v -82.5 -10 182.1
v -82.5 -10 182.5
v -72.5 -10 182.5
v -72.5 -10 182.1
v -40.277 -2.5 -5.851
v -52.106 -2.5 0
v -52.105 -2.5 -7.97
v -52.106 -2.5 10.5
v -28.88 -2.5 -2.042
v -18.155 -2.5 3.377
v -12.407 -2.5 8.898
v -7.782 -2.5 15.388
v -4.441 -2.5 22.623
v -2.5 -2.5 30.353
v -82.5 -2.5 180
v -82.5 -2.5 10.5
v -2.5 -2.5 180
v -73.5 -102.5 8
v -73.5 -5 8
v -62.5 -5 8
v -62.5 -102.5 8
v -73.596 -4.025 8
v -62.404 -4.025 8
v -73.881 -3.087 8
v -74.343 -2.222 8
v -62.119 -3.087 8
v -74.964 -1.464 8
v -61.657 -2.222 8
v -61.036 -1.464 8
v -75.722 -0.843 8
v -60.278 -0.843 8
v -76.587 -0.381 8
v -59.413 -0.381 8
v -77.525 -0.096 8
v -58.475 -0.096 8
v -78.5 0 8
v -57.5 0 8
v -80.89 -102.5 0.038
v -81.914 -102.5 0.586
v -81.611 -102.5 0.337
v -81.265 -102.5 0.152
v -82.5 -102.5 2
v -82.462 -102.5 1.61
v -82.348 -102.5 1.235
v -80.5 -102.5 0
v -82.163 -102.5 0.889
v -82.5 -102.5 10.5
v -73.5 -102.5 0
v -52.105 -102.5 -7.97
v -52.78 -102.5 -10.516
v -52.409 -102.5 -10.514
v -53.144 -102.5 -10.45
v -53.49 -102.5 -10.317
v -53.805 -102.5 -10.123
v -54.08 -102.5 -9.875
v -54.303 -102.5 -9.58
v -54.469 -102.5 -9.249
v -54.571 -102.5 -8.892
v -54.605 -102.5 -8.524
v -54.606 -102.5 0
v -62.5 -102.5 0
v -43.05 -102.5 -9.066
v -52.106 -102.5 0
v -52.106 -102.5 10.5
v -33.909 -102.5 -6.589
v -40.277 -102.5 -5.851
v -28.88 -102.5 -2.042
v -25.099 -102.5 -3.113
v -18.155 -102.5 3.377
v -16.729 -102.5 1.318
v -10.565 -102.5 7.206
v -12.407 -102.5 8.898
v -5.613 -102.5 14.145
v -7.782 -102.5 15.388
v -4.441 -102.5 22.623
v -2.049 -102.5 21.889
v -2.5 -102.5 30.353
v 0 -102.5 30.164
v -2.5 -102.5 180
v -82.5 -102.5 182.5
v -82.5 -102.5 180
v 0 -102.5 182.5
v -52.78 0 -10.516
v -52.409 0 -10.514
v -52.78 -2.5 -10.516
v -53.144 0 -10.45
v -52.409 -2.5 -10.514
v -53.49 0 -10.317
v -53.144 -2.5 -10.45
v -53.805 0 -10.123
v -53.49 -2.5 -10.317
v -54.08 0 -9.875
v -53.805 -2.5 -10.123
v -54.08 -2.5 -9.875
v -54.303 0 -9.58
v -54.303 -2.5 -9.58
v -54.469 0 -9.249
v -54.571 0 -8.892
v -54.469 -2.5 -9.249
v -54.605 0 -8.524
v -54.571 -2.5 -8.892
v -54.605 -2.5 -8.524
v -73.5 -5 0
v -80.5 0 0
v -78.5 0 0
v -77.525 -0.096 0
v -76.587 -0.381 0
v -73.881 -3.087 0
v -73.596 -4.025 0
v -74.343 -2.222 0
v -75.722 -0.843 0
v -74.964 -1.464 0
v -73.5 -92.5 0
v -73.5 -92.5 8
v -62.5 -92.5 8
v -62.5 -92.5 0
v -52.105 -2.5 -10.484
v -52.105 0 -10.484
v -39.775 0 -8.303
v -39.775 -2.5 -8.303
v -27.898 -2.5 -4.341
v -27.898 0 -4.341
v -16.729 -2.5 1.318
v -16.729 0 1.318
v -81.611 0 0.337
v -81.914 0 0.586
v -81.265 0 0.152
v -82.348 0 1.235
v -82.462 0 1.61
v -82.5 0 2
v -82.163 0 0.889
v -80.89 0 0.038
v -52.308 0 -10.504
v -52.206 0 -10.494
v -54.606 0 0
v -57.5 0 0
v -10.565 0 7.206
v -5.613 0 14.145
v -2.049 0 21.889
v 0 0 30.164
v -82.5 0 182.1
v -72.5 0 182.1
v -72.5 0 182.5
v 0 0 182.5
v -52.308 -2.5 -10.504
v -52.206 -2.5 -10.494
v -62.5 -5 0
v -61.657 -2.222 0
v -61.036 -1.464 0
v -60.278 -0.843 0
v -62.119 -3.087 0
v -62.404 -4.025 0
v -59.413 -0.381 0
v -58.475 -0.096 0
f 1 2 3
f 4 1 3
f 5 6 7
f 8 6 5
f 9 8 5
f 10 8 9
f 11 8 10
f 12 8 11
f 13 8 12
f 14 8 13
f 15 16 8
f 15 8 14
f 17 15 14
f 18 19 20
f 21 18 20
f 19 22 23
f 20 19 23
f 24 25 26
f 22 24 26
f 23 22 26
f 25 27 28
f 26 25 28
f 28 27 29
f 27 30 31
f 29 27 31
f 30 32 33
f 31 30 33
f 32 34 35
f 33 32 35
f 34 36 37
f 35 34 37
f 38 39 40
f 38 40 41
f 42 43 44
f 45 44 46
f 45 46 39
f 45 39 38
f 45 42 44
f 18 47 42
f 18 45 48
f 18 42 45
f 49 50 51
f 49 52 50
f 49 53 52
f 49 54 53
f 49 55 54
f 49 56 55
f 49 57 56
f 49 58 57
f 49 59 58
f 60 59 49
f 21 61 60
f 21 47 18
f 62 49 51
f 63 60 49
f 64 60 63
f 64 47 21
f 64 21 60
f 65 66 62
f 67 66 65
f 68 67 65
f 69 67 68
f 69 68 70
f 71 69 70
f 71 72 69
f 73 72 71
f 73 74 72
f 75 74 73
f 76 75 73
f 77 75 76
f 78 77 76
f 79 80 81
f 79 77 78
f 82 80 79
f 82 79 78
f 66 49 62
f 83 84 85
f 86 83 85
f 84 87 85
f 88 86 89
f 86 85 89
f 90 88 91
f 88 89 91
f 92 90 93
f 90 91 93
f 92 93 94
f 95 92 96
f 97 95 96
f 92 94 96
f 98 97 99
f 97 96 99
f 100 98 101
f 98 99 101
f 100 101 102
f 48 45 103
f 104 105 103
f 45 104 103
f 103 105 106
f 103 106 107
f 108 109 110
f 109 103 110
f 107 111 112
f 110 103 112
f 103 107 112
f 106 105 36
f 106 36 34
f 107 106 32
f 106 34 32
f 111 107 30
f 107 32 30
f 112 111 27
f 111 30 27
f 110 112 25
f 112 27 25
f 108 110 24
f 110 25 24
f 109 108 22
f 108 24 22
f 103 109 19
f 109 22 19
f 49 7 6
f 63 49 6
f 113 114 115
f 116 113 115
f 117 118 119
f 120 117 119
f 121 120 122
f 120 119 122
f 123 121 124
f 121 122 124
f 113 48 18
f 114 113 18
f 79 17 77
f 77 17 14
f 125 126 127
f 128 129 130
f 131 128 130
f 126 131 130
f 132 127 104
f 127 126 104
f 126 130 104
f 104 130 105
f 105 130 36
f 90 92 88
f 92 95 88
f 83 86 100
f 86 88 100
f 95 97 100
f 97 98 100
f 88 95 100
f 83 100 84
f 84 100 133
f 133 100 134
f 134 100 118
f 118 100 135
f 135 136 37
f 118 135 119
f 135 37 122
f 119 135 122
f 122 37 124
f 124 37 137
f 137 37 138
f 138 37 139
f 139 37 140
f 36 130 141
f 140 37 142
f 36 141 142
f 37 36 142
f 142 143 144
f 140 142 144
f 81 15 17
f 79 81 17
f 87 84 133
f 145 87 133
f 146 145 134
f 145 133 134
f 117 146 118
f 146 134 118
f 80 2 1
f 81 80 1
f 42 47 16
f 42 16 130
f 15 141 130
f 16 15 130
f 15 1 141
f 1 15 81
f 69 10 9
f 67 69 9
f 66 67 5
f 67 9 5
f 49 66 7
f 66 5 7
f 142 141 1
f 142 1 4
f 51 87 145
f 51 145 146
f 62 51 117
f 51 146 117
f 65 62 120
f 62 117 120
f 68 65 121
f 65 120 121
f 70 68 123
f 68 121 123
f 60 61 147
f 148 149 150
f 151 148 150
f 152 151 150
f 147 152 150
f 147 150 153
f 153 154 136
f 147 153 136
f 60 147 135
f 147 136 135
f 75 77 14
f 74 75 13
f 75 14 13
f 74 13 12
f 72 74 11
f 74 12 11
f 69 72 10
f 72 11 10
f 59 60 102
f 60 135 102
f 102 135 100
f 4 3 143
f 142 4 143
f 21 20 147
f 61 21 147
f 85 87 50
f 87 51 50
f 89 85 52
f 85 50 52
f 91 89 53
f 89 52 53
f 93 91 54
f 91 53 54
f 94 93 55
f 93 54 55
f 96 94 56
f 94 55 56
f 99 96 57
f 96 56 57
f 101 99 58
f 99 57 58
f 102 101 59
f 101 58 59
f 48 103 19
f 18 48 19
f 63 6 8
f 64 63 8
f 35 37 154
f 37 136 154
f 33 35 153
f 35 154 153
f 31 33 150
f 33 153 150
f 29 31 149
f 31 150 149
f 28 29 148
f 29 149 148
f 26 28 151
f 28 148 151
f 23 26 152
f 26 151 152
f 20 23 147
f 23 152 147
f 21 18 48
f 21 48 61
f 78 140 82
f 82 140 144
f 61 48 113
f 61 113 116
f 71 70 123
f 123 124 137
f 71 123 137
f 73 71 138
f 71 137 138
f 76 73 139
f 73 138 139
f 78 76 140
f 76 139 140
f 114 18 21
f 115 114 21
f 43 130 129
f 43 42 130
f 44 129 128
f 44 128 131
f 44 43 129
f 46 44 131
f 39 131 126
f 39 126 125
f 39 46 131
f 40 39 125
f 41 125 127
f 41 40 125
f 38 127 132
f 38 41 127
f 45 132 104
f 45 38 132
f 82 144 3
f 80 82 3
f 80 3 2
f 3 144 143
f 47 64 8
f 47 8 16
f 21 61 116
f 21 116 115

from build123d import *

# Parameters (mm, degrees)
F1_DEPTH  = 2.5
F2_DEPTH  = 2.2
F4_DEPTH  = 100
F5_W      = 11
F5_H      = 8
F6_DEPTH  = 10
F7_R      = 5
F8_R      = 2
F9_W      = 10
F9_H      = 10
F9_R      = 2.5
F10_DEPTH = 0.4


with BuildPart() as f1:
    # F0 (on Front) → F1 (new body)
    with BuildSketch(Plane.XZ):
        with BuildLine():
            Line((-82.5, 182.5), (-82.5, 0))
            Line((-82.5, 0), (-73.5, 0))
            Line((-73.5, 0), (-73.5, 8))
            Line((-73.5, 8), (-62.5, 8))
            Line((-62.5, 8), (-62.5, 0))
            Line((-62.5, 0), (-54.6057512313, 0))
            Line((-54.6057512313, 0), (-54.6047807907, -10.7011169374))
            ThreePointArc((-54.6047807907, -10.7011169374), (-53.3539902072, -10.6015296646), (-52.104800511, -10.4835474141))
            ThreePointArc((-52.104800511, -10.4835474141), (-33.7636269449, -6.5405298903), (-16.7286675849, 1.3179810741))
            ThreePointArc((-16.7286675849, 1.3179810741), (-5.6129224967, 14.1453039848), (0, 30.1638901573))
            Line((0, 30.1638901573), (0, 182.5))
            Line((0, 182.5), (-82.5, 182.5))
        make_face()
    extrude(amount=F1_DEPTH)

    # F0 (on Front) → F2 (join)
    with BuildSketch(Plane.XZ):
        with BuildLine():
            Line((-82.5, 182.5), (-82.5, 0))
            Line((-82.5, 0), (-73.5, 0))
            Line((-73.5, 0), (-73.5, 8))
            Line((-73.5, 8), (-62.5, 8))
            Line((-62.5, 8), (-62.5, 0))
            Line((-62.5, 0), (-54.6057512313, 0))
            Line((-54.6057512313, 0), (-54.6047807907, -10.7011169374))
            ThreePointArc((-54.6047807907, -10.7011169374), (-53.3539902072, -10.6015296646), (-52.104800511, -10.4835474141))
            ThreePointArc((-52.104800511, -10.4835474141), (-33.7636269449, -6.5405298903), (-16.7286675849, 1.3179810741))
            ThreePointArc((-16.7286675849, 1.3179810741), (-5.6129224967, 14.1453039848), (0, 30.1638901573))
            Line((0, 30.1638901573), (0, 182.5))
            Line((0, 182.5), (-82.5, 182.5))
        make_face()
    extrude(amount=F2_DEPTH)

    # F3 (on face) → F4 (join)
    with BuildSketch(Plane.XZ.offset(2.5)):
        with BuildLine():
            Line((-52.1050284328, -7.9702374423), (-52.1057512416, 0.0002267148))
            Line((-52.1057512416, 0.0002267148), (-52.1057512416, 8))
            Line((-52.1057512416, 8), (-52.1057512416, 10.5))
            Line((-52.1057512416, 10.5), (-62.5, 10.5))
            Line((-62.5, 10.5), (-82.5, 10.5))
            Line((-82.5, 10.5), (-82.5, 0))
            Line((-82.5, 0), (-73.5, 0))
            Line((-73.5, 0), (-73.5, 8))
            Line((-73.5, 8), (-62.5, 8))
            Line((-62.5, 8), (-62.5, 0))
            Line((-62.5, 0), (-54.6057512313, 0))
            Line((-54.6057512313, 0), (-54.6047807907, -10.7011169374))
            ThreePointArc((-54.6047807907, -10.7011169374), (-34.9567798568, -6.9288349734), (-16.7286675849, 1.3179810741))
            ThreePointArc((-16.7286675849, 1.3179810741), (-5.6129224967, 14.1453039848), (0, 30.1638901573))
            Line((0, 30.1638901573), (0, 182.5))
            Line((0, 182.5), (-82.5, 182.5))
            Line((-82.5, 182.5), (-82.5, 180))
            Line((-82.5, 180), (-2.5, 180))
            Line((-2.5, 180), (-2.5, 30.352550517))
            ThreePointArc((-2.5, 30.352550517), (-7.7823306987, 15.3878258145), (-18.1551322047, 3.3773723696))
            ThreePointArc((-18.1551322047, 3.3773723696), (-34.5092579263, -4.1538153816), (-52.1050284328, -7.9702374423))
        make_face()
    extrude(amount=F4_DEPTH)

    # F7
    f7_edges = [f1.edges().sort_by_distance(p)[0] for p in [
        (-62.5, 0, 4),
        (-73.5, 0, 4),
    ]]
    fillet(f7_edges, radius=F7_R)

    # F8
    f8_edges = [f1.edges().sort_by_distance(p)[0] for p in [
        (-54.604781, -51.25, -10.701117),
        (-82.5, -51.25, 0),
    ]]
    fillet(f8_edges, radius=F8_R)

    # F9 (on face) → F10 (cut)
    with BuildSketch(Plane.XY.offset(182.5)):
        with Locations((-77.5, -5)):
            Rectangle(F9_W, F9_H)
        with Locations((-77.5, -5)):
            Circle(F9_R, mode=Mode.SUBTRACT)
        with Locations((-77.5, -5)):
            Circle(F9_R)
    extrude(amount=-F10_DEPTH, mode=Mode.SUBTRACT)


with BuildPart() as f6:
    # F5 (on face) → F6 (new body)
    with BuildSketch(Plane.XZ.offset(102.5)):
        with Locations((-68, 4)):
            Rectangle(F5_W, F5_H)
    extrude(amount=-F6_DEPTH)


solid = Compound([f1.part, f6.part])
